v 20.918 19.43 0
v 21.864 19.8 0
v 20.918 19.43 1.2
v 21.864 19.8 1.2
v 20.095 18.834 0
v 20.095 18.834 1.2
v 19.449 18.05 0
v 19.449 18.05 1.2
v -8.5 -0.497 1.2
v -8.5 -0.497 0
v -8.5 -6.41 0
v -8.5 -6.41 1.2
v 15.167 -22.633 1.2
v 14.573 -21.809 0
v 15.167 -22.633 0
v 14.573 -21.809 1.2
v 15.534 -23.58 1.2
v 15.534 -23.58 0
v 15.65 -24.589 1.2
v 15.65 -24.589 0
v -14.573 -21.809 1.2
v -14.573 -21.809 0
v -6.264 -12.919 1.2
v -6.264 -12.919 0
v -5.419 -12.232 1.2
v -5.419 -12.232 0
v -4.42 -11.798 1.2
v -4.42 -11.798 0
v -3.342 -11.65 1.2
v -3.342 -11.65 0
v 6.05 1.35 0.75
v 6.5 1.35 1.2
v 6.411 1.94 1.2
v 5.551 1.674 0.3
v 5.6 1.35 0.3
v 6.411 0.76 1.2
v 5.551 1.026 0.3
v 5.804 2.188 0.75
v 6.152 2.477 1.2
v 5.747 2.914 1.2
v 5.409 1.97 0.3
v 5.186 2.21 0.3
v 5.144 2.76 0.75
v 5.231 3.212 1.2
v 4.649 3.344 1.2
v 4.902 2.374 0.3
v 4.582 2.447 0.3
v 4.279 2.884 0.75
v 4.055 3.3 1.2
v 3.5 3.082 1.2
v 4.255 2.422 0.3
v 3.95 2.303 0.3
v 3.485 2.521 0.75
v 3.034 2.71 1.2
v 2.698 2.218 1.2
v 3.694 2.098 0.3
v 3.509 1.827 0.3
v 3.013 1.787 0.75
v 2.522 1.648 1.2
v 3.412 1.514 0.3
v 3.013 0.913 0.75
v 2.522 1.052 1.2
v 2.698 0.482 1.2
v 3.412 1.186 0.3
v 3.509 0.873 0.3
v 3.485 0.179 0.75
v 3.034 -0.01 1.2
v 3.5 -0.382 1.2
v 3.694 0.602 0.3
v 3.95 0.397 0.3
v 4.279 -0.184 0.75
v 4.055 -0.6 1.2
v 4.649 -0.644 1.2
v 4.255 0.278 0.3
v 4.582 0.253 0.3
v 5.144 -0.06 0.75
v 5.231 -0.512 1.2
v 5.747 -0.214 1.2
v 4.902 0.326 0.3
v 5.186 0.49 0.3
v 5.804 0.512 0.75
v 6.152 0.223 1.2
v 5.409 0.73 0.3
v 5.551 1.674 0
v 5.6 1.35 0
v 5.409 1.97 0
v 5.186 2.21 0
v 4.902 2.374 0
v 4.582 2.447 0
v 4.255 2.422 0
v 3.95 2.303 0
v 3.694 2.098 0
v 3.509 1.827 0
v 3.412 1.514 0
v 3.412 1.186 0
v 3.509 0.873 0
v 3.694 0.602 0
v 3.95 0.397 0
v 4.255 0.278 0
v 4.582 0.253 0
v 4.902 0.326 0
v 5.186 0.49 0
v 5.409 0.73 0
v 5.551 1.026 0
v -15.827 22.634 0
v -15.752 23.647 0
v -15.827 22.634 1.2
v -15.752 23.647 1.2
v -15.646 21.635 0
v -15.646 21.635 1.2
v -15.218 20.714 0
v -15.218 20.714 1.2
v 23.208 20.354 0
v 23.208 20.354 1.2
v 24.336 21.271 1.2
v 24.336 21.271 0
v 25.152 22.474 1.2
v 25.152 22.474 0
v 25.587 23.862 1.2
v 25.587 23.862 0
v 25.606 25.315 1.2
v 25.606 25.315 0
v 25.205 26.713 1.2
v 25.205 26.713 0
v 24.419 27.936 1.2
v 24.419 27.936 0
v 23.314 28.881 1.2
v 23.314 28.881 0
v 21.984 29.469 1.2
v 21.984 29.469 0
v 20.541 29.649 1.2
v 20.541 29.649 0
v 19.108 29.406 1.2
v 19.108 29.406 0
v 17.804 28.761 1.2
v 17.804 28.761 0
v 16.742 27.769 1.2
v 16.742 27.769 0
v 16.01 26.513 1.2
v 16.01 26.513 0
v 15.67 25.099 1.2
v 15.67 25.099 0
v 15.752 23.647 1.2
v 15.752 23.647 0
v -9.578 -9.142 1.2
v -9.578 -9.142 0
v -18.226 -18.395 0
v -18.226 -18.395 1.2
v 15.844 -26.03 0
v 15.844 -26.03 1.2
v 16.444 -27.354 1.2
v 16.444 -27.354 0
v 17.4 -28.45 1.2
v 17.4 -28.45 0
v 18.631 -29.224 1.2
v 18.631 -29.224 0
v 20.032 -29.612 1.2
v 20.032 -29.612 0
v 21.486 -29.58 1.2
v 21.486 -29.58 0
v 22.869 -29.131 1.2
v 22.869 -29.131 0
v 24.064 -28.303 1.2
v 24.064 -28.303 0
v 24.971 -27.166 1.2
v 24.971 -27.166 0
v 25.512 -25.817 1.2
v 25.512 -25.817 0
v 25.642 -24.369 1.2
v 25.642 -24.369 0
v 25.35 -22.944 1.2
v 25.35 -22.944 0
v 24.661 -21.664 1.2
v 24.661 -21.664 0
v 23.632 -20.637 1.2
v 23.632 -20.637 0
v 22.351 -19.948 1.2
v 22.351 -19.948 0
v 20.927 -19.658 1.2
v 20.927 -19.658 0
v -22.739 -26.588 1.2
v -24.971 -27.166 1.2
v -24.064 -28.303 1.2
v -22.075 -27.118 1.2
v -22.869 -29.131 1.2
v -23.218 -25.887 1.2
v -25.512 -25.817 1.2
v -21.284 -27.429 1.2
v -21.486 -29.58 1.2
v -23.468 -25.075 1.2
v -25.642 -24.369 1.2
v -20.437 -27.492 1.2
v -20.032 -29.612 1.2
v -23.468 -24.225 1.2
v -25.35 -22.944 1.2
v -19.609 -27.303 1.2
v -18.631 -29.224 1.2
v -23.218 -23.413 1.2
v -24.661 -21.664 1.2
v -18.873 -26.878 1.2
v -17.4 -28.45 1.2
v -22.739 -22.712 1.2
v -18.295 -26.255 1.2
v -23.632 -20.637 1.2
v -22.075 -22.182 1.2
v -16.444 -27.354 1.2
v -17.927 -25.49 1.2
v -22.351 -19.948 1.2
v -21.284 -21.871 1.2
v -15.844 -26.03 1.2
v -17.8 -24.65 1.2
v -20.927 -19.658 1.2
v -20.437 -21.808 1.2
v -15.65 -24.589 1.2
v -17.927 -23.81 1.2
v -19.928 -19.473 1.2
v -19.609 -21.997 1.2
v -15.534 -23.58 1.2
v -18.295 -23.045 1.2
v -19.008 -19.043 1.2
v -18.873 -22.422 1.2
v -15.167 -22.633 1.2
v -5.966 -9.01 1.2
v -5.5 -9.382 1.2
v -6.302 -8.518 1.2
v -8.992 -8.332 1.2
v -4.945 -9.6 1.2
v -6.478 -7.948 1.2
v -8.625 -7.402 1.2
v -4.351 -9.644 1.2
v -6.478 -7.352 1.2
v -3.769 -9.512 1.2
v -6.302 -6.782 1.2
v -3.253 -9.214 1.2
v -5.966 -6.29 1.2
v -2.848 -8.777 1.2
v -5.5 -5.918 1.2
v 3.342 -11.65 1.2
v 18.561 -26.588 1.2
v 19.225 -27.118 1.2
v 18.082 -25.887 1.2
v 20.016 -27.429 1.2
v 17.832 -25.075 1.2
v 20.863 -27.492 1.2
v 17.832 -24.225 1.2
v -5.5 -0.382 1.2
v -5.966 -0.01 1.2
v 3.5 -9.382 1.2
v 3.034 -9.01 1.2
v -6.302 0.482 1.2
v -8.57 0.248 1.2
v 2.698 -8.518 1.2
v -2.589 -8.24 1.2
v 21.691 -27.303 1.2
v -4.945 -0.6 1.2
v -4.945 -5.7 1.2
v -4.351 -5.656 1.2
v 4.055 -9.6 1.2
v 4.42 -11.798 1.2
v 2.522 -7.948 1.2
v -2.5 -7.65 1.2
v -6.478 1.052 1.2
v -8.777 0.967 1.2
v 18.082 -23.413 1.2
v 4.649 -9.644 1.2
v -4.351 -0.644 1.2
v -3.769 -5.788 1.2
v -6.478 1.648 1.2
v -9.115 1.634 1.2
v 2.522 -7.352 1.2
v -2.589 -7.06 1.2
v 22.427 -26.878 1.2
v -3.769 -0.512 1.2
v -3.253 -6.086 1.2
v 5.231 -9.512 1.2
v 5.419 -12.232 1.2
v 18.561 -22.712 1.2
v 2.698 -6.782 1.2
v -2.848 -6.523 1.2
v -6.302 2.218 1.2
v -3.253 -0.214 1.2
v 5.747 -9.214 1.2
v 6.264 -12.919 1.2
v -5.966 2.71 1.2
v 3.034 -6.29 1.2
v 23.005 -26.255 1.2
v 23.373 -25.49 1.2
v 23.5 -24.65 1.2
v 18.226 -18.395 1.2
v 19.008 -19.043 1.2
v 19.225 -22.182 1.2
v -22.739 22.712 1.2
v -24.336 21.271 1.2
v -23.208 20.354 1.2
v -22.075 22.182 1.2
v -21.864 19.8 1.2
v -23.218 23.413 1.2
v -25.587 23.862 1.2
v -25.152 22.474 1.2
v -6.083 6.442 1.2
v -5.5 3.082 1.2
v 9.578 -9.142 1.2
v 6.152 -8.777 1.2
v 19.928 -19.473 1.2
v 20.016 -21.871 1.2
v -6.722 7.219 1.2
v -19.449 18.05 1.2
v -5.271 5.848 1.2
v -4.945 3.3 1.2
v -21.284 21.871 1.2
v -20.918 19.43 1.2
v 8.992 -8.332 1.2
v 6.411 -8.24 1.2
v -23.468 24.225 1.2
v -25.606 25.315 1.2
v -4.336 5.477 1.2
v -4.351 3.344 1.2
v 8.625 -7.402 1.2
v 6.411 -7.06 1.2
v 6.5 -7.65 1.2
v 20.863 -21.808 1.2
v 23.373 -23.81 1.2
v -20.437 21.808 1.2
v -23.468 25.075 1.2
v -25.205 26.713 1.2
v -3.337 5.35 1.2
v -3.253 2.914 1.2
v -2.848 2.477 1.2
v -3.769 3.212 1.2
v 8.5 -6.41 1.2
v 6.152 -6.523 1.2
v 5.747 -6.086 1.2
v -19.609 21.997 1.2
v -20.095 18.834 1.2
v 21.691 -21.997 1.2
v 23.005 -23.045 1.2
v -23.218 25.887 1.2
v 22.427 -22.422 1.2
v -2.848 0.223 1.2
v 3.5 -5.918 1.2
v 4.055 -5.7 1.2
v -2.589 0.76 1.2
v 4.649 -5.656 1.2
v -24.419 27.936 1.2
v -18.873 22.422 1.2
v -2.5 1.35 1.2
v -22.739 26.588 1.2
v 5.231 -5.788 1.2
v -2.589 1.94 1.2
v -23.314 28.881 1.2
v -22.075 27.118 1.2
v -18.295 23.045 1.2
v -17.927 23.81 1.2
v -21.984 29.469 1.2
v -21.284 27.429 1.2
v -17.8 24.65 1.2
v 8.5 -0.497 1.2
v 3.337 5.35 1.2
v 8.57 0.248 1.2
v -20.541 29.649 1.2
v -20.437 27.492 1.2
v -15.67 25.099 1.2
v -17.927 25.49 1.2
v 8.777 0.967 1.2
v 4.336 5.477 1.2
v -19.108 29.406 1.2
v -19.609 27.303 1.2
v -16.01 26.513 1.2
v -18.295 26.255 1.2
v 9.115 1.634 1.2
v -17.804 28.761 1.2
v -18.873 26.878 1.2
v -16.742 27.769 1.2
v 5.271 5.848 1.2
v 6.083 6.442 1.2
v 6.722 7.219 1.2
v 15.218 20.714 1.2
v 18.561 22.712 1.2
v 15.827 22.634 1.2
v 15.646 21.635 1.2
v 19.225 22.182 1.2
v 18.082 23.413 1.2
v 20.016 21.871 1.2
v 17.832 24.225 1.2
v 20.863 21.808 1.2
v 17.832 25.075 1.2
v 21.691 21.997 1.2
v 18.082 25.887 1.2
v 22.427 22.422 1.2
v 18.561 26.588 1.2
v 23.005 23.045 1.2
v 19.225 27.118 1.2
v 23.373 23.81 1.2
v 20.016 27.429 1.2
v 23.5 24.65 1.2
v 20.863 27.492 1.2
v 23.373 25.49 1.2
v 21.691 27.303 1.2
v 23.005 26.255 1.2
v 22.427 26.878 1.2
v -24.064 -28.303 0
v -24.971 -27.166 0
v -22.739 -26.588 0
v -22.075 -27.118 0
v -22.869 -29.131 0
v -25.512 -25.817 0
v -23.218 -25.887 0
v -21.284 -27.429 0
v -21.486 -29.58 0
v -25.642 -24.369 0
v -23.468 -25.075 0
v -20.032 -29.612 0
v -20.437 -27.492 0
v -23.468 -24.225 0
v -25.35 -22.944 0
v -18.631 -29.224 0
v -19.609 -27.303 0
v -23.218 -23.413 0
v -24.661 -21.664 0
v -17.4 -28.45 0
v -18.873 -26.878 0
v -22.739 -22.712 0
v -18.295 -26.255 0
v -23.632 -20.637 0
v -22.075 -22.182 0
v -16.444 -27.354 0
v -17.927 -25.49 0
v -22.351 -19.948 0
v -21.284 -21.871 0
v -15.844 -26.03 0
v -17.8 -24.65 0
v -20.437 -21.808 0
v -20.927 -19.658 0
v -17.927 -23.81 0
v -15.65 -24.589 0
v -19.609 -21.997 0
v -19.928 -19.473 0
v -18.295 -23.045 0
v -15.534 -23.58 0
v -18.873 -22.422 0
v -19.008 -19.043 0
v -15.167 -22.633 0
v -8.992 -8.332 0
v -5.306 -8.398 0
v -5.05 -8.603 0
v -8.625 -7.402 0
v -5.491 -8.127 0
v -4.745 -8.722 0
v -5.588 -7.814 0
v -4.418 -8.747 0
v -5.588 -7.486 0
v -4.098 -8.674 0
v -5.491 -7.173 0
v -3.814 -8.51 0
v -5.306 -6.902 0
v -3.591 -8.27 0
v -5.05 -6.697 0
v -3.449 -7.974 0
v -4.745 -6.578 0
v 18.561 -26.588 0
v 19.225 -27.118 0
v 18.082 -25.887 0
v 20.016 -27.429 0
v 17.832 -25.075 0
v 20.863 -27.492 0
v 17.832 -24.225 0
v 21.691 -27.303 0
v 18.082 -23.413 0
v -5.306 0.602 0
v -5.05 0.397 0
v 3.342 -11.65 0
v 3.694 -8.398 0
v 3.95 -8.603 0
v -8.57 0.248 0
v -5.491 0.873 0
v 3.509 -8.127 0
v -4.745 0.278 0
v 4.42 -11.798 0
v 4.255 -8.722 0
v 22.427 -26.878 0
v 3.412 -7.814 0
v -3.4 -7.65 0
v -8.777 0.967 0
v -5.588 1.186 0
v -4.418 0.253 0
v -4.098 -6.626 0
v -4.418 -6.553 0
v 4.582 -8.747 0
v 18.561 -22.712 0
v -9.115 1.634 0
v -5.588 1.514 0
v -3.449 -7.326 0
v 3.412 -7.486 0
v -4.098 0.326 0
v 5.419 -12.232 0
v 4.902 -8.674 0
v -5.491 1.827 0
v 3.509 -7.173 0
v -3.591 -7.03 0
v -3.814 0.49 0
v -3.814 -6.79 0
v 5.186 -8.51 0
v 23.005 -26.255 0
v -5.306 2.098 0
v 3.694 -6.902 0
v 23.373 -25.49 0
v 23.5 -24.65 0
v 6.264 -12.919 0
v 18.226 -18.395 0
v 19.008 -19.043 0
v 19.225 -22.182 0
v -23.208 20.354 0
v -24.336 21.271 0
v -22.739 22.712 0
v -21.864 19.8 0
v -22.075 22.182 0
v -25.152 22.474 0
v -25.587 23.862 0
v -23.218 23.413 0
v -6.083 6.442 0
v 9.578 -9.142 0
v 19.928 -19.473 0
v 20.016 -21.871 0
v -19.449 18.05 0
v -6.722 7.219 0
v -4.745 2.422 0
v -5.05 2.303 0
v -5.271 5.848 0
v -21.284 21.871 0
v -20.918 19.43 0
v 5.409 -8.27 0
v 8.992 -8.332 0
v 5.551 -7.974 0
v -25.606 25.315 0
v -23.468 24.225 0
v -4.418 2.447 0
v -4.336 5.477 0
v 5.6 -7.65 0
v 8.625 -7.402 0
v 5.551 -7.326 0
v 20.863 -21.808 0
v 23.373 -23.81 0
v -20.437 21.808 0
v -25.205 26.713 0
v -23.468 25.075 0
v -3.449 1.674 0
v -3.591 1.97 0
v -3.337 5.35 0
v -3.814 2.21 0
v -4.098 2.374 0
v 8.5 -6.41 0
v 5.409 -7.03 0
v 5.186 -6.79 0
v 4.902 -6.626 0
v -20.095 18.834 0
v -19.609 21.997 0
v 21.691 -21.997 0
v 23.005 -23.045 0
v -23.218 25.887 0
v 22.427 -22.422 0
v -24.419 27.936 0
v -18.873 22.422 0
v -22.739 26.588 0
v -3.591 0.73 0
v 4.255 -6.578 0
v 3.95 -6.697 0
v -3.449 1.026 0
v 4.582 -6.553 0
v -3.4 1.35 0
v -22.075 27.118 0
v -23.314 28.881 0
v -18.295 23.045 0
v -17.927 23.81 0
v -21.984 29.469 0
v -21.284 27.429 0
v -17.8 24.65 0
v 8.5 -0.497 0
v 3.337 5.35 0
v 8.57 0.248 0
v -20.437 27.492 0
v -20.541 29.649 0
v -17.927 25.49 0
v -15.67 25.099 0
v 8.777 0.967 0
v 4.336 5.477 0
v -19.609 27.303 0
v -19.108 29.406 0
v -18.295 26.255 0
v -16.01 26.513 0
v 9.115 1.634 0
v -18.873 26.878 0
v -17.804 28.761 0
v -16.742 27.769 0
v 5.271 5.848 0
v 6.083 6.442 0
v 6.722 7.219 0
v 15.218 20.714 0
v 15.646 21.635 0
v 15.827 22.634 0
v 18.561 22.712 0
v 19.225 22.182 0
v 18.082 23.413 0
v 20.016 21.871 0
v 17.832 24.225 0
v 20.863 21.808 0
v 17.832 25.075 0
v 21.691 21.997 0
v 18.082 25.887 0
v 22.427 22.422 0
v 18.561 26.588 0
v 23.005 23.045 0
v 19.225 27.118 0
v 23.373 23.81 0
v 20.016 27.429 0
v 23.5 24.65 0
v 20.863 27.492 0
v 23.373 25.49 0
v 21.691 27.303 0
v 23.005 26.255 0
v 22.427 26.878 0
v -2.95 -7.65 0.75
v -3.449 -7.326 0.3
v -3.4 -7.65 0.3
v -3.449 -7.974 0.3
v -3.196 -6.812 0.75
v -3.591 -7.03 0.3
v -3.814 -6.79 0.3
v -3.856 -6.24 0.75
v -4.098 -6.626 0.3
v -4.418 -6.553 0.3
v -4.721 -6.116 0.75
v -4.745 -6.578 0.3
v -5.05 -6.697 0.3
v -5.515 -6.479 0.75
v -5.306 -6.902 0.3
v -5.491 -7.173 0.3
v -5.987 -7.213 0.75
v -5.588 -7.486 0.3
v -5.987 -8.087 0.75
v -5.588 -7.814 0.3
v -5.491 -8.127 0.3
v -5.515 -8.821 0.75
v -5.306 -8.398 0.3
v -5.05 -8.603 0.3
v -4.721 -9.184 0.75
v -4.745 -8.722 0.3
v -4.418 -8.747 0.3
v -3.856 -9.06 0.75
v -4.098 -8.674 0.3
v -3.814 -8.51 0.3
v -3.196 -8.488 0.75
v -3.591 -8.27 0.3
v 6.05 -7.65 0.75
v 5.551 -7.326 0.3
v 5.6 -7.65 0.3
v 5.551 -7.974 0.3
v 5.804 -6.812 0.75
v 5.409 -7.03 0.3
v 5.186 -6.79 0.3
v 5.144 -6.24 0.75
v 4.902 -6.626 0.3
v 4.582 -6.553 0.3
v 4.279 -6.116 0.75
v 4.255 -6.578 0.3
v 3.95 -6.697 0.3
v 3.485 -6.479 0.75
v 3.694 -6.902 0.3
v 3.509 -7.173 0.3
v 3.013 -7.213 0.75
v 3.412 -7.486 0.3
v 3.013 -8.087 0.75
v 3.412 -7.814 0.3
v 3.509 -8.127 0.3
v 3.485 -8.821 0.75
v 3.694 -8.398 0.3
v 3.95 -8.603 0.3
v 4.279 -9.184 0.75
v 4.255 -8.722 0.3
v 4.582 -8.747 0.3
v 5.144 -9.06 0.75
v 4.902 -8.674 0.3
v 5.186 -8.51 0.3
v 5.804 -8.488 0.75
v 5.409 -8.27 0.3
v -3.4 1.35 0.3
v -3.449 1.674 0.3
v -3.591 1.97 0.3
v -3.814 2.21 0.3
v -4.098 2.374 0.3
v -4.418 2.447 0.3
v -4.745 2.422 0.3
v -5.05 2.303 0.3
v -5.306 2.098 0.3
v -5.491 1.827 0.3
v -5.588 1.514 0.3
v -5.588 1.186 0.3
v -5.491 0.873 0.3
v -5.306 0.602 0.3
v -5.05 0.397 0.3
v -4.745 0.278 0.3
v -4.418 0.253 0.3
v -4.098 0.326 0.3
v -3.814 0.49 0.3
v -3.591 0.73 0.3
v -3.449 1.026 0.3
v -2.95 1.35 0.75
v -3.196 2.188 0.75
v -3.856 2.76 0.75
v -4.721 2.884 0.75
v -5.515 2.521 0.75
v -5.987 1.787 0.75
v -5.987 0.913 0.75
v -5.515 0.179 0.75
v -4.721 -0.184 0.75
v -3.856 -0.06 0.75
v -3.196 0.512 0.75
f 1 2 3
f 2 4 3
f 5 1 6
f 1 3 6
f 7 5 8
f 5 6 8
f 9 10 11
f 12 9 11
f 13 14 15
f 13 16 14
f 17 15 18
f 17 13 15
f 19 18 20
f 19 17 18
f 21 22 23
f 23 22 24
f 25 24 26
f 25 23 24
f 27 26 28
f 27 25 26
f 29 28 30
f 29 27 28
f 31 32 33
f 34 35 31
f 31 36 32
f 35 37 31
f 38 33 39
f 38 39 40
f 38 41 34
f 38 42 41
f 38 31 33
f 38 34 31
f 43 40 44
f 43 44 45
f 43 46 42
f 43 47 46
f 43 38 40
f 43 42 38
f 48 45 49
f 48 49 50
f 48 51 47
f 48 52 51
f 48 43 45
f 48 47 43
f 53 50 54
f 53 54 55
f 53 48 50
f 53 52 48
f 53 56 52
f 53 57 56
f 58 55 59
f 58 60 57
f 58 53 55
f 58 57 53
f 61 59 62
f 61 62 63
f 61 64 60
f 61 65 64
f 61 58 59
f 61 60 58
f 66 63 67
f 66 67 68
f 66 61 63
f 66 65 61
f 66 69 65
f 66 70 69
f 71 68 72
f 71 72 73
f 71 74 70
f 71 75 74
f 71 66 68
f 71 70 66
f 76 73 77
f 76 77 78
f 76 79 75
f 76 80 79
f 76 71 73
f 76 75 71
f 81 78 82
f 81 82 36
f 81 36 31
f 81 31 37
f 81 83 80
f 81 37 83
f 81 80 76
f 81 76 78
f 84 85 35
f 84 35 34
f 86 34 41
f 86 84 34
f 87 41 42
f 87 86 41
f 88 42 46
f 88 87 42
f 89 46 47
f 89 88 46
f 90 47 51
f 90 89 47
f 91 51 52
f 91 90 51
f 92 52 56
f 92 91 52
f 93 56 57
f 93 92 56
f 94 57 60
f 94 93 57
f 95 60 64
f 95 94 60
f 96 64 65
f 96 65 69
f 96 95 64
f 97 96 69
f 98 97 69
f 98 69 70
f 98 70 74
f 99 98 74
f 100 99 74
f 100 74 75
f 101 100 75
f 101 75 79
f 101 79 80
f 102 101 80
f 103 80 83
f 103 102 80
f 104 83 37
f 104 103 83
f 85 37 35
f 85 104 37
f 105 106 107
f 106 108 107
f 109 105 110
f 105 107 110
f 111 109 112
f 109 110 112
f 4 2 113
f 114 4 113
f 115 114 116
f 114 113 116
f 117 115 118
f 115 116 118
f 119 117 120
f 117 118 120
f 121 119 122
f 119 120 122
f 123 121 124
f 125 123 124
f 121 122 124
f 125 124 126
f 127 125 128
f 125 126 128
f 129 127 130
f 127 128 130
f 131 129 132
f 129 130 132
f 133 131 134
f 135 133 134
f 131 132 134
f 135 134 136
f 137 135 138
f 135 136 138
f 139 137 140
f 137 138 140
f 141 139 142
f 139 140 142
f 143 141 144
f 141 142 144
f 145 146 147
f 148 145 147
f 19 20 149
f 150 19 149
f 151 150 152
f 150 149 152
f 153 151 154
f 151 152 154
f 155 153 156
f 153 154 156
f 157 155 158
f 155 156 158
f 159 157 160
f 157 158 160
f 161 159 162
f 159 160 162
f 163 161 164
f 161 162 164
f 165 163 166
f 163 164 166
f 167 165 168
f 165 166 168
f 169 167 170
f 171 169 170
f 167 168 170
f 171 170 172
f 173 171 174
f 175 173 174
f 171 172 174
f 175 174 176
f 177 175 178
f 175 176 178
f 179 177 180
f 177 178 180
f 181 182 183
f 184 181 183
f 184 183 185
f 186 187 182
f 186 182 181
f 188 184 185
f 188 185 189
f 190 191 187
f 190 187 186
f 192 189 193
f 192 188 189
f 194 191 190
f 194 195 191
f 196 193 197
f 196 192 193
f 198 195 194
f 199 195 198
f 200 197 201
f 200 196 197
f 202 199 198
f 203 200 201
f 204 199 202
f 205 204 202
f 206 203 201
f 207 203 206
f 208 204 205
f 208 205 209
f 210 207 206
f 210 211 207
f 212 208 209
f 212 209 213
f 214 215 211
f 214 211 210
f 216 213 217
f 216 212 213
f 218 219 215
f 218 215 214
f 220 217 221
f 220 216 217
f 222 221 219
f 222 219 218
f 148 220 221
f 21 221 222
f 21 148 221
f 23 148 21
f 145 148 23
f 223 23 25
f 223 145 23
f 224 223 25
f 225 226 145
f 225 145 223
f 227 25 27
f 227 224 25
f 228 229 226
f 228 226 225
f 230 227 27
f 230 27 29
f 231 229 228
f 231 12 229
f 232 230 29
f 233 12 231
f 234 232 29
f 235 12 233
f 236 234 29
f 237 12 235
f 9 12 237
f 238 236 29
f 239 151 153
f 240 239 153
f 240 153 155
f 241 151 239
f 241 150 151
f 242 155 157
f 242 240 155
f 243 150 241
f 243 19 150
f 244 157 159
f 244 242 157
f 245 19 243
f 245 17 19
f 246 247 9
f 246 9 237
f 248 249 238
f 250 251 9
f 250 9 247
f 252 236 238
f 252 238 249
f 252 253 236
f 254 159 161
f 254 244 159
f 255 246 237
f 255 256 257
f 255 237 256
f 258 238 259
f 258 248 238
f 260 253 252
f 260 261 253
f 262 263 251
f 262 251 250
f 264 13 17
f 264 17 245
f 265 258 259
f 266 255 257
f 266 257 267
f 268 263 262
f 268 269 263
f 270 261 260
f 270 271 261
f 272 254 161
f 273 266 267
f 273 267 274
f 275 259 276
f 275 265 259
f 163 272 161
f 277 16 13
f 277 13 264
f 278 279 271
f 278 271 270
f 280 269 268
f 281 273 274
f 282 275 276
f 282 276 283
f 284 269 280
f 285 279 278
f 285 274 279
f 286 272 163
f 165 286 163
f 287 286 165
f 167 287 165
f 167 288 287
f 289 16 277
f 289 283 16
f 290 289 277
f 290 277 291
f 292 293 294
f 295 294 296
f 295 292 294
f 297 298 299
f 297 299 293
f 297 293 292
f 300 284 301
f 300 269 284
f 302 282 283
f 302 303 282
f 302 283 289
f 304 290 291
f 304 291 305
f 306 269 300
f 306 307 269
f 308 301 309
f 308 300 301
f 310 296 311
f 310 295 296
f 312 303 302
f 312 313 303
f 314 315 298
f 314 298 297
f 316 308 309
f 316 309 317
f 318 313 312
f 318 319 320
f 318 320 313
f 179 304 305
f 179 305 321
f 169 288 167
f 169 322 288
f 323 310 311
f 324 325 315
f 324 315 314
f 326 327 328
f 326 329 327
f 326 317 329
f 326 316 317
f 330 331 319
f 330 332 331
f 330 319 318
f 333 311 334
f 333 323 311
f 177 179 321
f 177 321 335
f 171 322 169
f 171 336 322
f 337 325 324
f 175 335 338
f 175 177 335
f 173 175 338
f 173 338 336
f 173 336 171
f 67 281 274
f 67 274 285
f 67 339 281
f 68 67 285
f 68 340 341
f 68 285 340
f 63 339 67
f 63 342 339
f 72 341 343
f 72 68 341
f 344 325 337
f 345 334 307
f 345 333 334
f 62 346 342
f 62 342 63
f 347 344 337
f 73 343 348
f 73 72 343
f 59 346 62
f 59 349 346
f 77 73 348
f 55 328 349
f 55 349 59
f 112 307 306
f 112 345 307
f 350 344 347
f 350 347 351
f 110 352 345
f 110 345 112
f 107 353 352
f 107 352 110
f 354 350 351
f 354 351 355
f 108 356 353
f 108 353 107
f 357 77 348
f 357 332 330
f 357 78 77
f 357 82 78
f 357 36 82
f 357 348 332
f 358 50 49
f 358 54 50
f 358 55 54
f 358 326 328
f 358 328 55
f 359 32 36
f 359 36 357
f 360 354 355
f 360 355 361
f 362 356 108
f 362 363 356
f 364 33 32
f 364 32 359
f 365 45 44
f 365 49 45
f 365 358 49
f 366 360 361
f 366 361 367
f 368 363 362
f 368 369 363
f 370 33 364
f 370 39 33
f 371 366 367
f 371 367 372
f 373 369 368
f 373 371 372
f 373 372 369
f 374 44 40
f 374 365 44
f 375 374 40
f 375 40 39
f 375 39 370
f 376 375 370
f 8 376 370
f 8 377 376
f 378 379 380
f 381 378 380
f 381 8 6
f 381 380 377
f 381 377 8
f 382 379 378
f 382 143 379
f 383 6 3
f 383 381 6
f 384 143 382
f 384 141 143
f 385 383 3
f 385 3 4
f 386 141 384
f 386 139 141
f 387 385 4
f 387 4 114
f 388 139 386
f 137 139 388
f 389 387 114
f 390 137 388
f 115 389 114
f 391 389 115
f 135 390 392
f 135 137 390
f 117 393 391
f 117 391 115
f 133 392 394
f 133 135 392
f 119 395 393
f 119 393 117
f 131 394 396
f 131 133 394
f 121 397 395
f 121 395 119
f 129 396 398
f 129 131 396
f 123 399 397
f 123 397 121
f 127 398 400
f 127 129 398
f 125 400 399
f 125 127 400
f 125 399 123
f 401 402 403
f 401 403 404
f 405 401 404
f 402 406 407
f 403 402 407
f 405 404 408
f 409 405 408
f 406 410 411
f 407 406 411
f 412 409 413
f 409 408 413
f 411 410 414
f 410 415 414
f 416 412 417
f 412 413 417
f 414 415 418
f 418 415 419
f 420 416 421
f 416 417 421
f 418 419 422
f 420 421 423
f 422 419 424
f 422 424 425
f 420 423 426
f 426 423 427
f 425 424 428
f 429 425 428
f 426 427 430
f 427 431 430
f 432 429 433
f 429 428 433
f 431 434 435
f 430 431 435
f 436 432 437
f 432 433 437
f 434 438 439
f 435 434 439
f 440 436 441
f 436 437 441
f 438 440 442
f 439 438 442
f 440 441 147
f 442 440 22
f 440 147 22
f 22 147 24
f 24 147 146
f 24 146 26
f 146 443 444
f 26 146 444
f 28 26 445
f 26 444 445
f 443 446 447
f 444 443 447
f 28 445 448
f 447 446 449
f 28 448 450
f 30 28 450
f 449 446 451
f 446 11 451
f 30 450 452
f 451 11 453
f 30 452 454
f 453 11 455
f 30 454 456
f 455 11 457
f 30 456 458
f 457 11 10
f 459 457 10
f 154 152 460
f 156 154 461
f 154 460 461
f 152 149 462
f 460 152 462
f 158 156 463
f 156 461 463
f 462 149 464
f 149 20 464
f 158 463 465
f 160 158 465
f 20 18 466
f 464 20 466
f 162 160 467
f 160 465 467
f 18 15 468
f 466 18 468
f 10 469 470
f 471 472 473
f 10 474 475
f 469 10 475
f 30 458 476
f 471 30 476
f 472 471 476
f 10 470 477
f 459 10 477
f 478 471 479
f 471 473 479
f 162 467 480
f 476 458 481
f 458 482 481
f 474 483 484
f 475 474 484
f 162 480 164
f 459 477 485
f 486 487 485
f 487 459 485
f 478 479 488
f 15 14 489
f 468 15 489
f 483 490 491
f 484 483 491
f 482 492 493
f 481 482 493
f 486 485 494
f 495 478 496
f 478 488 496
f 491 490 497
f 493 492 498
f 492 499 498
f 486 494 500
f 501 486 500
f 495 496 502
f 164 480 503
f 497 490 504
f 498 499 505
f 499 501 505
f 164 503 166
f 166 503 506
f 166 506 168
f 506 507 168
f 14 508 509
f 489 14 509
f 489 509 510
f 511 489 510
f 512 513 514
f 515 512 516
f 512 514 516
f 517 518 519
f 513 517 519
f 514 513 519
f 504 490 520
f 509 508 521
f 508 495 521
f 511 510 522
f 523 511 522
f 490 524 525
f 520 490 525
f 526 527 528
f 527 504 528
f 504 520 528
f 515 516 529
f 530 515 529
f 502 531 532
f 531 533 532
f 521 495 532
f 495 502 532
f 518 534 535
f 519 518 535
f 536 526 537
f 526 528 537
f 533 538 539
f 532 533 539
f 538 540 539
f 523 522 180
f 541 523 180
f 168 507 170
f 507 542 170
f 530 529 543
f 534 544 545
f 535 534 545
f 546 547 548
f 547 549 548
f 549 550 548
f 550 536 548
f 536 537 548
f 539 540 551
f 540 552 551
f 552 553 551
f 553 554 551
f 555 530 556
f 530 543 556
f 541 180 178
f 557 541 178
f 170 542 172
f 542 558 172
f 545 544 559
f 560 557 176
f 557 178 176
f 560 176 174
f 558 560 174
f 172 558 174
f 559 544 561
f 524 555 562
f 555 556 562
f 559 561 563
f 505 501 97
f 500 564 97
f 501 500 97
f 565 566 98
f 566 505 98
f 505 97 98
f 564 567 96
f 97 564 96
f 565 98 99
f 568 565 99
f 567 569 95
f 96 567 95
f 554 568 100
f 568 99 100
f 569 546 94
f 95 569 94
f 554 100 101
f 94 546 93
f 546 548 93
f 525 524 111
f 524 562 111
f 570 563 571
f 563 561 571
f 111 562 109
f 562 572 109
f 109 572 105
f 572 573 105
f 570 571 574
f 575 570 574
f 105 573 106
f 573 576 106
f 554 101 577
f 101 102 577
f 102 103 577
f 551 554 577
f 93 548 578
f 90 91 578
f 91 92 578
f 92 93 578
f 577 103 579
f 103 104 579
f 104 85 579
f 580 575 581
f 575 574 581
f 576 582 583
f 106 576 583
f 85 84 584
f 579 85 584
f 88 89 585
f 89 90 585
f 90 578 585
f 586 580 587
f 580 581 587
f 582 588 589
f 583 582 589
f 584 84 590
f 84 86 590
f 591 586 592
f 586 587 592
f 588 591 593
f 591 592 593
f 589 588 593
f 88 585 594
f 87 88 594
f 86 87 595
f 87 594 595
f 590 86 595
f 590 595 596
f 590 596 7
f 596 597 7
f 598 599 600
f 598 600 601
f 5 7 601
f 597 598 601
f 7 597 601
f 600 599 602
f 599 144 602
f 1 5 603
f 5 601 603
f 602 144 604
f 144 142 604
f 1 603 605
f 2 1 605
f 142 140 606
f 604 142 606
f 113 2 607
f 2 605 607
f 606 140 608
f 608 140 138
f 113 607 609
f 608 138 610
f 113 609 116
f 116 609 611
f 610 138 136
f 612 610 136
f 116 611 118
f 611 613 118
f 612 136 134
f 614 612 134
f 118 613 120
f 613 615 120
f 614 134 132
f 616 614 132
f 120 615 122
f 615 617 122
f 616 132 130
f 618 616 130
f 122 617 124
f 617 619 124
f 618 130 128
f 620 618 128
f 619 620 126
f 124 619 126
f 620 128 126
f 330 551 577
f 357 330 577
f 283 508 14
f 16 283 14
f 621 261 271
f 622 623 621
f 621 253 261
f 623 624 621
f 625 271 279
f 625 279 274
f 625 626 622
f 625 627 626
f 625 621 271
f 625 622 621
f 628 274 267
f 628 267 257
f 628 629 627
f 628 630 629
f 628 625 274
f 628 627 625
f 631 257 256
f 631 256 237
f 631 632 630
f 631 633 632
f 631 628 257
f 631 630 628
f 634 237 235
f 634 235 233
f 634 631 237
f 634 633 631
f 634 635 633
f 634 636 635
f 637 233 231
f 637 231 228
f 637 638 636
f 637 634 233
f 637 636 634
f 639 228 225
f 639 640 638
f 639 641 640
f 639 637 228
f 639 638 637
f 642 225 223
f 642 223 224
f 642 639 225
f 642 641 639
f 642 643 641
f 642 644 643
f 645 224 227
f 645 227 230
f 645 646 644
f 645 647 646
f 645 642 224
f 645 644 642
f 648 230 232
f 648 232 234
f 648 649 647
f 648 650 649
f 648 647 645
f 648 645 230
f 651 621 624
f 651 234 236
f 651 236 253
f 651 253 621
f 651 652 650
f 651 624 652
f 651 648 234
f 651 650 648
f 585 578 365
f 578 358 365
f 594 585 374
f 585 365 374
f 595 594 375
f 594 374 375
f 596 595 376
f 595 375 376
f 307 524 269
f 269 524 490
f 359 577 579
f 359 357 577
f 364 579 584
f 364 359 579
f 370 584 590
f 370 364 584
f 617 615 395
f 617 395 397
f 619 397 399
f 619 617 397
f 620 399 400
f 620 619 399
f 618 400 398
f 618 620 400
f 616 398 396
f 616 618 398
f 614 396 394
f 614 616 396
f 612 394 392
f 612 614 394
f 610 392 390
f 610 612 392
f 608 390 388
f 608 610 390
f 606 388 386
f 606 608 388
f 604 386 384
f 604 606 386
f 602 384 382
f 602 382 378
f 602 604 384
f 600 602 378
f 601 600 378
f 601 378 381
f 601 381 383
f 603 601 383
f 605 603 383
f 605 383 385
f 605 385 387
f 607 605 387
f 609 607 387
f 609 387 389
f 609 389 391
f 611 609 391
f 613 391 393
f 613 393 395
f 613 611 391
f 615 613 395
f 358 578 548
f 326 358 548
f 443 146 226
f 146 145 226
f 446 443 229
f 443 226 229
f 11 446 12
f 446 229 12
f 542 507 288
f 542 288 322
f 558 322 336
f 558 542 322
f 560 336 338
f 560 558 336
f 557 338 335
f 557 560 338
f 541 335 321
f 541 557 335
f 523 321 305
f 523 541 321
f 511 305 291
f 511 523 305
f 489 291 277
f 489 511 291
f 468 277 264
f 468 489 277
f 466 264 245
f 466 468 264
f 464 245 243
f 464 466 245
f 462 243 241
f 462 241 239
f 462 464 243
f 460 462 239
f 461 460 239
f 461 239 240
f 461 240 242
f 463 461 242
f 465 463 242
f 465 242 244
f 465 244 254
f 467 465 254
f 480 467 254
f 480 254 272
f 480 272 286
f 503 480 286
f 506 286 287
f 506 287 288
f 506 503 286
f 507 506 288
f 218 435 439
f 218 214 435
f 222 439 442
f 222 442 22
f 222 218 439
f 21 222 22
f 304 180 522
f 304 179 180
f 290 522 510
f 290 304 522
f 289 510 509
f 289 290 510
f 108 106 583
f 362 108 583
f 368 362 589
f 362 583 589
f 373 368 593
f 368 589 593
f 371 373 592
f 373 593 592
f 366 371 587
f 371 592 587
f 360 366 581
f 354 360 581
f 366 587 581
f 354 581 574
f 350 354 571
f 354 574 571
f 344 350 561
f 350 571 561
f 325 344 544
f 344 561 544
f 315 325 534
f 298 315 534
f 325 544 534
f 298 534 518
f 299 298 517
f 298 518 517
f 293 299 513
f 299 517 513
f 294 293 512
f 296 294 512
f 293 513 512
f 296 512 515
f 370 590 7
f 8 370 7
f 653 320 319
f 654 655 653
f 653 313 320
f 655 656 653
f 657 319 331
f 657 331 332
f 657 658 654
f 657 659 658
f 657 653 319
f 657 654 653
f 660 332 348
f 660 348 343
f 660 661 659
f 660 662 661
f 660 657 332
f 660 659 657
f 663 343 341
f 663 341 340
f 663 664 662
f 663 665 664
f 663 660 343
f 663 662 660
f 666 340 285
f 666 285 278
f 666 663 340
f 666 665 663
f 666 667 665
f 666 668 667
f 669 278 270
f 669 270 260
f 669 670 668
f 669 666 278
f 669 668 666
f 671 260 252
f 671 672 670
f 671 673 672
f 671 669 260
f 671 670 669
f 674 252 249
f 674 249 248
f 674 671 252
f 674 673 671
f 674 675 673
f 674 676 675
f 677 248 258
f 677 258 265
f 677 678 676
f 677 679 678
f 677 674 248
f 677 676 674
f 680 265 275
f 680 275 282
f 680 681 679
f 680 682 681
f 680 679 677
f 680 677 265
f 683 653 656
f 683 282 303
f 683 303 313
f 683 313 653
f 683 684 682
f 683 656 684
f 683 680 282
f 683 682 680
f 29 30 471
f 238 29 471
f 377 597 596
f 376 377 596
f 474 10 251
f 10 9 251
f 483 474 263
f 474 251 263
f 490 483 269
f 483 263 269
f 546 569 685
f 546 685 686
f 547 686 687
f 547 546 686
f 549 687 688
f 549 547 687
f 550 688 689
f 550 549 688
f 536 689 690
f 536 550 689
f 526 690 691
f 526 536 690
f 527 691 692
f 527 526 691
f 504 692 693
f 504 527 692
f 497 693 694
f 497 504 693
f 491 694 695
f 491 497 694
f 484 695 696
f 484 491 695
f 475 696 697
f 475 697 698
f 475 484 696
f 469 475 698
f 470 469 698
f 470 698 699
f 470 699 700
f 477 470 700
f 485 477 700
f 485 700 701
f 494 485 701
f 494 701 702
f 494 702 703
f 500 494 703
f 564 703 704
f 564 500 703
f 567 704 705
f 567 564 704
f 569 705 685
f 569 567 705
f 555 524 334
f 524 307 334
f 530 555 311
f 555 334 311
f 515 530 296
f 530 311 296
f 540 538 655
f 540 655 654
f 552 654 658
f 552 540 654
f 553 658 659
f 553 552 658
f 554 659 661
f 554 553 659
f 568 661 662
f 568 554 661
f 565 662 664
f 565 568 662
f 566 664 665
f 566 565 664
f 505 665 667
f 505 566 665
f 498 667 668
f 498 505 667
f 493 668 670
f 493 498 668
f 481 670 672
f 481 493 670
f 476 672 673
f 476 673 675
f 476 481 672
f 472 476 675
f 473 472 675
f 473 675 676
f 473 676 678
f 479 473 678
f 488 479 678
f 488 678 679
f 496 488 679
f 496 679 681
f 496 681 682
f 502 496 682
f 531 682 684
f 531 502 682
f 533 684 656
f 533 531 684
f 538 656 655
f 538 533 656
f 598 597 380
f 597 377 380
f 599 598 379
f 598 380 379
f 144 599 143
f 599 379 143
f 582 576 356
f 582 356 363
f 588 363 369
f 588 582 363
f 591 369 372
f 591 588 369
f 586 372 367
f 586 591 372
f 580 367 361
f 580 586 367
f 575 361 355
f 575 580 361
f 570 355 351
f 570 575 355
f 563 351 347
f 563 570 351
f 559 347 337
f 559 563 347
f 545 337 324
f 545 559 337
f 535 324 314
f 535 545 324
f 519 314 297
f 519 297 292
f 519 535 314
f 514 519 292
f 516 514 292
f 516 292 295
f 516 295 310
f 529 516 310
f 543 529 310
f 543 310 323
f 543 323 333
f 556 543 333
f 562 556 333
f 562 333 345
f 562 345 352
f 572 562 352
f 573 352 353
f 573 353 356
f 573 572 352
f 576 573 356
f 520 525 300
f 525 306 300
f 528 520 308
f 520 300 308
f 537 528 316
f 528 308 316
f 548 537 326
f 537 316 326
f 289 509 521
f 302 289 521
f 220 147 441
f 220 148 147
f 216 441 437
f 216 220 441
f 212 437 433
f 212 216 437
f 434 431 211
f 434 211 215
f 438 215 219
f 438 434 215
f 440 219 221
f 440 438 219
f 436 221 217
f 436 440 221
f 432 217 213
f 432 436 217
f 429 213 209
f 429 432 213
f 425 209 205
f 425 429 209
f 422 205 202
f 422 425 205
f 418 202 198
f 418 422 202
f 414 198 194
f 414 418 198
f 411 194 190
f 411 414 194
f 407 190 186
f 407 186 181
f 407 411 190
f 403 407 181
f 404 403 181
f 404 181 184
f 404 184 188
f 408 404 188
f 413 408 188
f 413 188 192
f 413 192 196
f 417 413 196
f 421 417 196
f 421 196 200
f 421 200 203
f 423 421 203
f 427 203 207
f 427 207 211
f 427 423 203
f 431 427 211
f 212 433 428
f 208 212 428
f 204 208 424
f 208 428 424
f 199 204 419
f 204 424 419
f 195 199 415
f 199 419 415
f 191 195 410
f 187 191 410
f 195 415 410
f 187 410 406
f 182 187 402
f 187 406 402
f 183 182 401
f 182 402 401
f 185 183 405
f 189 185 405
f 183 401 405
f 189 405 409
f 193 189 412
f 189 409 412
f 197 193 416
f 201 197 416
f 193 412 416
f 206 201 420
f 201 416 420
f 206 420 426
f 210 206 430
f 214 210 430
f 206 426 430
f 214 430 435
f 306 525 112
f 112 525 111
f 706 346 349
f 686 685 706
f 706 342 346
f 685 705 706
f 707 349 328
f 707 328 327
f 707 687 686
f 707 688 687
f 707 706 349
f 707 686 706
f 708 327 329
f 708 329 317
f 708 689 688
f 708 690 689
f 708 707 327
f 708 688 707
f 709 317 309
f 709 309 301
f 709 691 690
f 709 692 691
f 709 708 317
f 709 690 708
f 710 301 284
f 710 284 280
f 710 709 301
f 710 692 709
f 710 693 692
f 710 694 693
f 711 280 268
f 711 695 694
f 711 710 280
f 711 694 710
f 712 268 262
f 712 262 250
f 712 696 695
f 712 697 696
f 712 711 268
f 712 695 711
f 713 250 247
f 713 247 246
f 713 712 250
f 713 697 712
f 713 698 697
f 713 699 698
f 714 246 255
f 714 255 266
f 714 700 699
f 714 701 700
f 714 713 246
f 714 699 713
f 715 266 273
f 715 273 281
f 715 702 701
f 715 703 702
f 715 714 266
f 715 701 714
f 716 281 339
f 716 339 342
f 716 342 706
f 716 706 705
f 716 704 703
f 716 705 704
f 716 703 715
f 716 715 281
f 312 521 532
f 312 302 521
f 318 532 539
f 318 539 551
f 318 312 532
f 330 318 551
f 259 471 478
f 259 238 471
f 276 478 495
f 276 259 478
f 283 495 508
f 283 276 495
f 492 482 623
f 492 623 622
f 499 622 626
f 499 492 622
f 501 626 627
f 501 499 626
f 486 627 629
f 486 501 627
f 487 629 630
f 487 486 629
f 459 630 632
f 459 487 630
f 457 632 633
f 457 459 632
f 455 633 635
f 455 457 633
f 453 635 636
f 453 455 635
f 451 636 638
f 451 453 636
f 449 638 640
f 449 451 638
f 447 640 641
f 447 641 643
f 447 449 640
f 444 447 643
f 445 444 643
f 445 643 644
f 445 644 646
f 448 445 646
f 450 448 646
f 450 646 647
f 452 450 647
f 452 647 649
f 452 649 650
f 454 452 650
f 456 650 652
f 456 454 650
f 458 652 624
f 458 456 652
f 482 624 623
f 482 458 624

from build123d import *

# Parameters (mm, degrees)
F1_R     = 2.85
F1_R_2   = 1.1
F2_DEPTH = 1.2
F3_R     = 4
F4_SIZE  = 0.9


with BuildPart() as f2:
    # F1 (on Top) → F2 (new body)
    with BuildSketch(Plane.XY):
        with BuildLine():
            Line((-8.5, -7.988706), (-19.519778, -19.779415))
            ThreePointArc((-19.519778, -19.779415), (-24.064093, -28.302939), (-15.866839, -23.193508))
            Line((-15.866839, -23.193508), (-5.078098, -11.65))
            Line((-5.078098, -11.65), (5.078098, -11.65))
            Line((5.078098, -11.65), (15.866839, -23.193508))
            ThreePointArc((15.866839, -23.193508), (24.064093, -28.302939), (19.519778, -19.779415))
            Line((19.519778, -19.779415), (8.5, -7.988706))
            Line((8.5, -7.988706), (8.5, 0.657413))
            Line((8.5, 0.657413), (20.458776, 19.653658))
            ThreePointArc((20.458776, 19.653658), (23.313776, 28.881347), (16.227429, 22.317434))
            Line((16.227429, 22.317434), (5.545858, 5.35))
            Line((5.545858, 5.35), (-5.545858, 5.35))
            Line((-5.545858, 5.35), (-16.227429, 22.317434))
            ThreePointArc((-16.227429, 22.317434), (-23.313776, 28.881347), (-20.458776, 19.653658))
            Line((-20.458776, 19.653658), (-8.5, 0.657413))
            Line((-8.5, 0.657413), (-8.5, -7.988706))
        make_face()
        with Locations((-20.65, -24.65)):
            Circle(F1_R, mode=Mode.SUBTRACT)
        with Locations((-4.5, -7.65)):
            Circle(F1_R_2, mode=Mode.SUBTRACT)
        with Locations((20.65, -24.65)):
            Circle(F1_R, mode=Mode.SUBTRACT)
        with Locations((4.5, -7.65)):
            Circle(F1_R_2, mode=Mode.SUBTRACT)
        with Locations((-4.5, 1.35)):
            Circle(F1_R_2, mode=Mode.SUBTRACT)
        with Locations((-20.65, 24.65)):
            Circle(F1_R, mode=Mode.SUBTRACT)
        with Locations((4.5, 1.35)):
            Circle(F1_R_2, mode=Mode.SUBTRACT)
        with Locations((20.65, 24.65)):
            Circle(F1_R, mode=Mode.SUBTRACT)
    extrude(amount=F2_DEPTH)

    # F3
    f3_edges = [f2.edges().sort_by_distance(p)[0] for p in [
        (-5.545858, 5.35, 0.6),
        (5.545858, 5.35, 0.6),
        (-16.227429, 22.317434, 0.6),
        (-20.458776, 19.653658, 0.6),
        (16.227429, 22.317434, 0.6),
        (20.458776, 19.653658, 0.6),
        (8.5, 0.657413, 0.6),
        (8.5, -7.988706, 0.6),
        (19.519778, -19.779415, 0.6),
        (15.866839, -23.193508, 0.6),
        (5.078098, -11.65, 0.6),
        (-5.078098, -11.65, 0.6),
        (-15.866839, -23.193508, 0.6),
        (-8.5, 0.657413, 0.6),
        (-8.5, -7.988706, 0.6),
        (-19.519778, -19.779415, 0.6),
    ]]
    fillet(f3_edges, radius=F3_R)

    # F4
    f4_edges = [f2.edges().sort_by_distance(p)[0] for p in [
        (-5.6, 1.35, 1.2),
        (3.4, 1.35, 1.2),
        (3.4, -7.65, 1.2),
        (-5.6, -7.65, 1.2),
    ]]
    chamfer(f4_edges, length=F4_SIZE)


solid = f2.part
